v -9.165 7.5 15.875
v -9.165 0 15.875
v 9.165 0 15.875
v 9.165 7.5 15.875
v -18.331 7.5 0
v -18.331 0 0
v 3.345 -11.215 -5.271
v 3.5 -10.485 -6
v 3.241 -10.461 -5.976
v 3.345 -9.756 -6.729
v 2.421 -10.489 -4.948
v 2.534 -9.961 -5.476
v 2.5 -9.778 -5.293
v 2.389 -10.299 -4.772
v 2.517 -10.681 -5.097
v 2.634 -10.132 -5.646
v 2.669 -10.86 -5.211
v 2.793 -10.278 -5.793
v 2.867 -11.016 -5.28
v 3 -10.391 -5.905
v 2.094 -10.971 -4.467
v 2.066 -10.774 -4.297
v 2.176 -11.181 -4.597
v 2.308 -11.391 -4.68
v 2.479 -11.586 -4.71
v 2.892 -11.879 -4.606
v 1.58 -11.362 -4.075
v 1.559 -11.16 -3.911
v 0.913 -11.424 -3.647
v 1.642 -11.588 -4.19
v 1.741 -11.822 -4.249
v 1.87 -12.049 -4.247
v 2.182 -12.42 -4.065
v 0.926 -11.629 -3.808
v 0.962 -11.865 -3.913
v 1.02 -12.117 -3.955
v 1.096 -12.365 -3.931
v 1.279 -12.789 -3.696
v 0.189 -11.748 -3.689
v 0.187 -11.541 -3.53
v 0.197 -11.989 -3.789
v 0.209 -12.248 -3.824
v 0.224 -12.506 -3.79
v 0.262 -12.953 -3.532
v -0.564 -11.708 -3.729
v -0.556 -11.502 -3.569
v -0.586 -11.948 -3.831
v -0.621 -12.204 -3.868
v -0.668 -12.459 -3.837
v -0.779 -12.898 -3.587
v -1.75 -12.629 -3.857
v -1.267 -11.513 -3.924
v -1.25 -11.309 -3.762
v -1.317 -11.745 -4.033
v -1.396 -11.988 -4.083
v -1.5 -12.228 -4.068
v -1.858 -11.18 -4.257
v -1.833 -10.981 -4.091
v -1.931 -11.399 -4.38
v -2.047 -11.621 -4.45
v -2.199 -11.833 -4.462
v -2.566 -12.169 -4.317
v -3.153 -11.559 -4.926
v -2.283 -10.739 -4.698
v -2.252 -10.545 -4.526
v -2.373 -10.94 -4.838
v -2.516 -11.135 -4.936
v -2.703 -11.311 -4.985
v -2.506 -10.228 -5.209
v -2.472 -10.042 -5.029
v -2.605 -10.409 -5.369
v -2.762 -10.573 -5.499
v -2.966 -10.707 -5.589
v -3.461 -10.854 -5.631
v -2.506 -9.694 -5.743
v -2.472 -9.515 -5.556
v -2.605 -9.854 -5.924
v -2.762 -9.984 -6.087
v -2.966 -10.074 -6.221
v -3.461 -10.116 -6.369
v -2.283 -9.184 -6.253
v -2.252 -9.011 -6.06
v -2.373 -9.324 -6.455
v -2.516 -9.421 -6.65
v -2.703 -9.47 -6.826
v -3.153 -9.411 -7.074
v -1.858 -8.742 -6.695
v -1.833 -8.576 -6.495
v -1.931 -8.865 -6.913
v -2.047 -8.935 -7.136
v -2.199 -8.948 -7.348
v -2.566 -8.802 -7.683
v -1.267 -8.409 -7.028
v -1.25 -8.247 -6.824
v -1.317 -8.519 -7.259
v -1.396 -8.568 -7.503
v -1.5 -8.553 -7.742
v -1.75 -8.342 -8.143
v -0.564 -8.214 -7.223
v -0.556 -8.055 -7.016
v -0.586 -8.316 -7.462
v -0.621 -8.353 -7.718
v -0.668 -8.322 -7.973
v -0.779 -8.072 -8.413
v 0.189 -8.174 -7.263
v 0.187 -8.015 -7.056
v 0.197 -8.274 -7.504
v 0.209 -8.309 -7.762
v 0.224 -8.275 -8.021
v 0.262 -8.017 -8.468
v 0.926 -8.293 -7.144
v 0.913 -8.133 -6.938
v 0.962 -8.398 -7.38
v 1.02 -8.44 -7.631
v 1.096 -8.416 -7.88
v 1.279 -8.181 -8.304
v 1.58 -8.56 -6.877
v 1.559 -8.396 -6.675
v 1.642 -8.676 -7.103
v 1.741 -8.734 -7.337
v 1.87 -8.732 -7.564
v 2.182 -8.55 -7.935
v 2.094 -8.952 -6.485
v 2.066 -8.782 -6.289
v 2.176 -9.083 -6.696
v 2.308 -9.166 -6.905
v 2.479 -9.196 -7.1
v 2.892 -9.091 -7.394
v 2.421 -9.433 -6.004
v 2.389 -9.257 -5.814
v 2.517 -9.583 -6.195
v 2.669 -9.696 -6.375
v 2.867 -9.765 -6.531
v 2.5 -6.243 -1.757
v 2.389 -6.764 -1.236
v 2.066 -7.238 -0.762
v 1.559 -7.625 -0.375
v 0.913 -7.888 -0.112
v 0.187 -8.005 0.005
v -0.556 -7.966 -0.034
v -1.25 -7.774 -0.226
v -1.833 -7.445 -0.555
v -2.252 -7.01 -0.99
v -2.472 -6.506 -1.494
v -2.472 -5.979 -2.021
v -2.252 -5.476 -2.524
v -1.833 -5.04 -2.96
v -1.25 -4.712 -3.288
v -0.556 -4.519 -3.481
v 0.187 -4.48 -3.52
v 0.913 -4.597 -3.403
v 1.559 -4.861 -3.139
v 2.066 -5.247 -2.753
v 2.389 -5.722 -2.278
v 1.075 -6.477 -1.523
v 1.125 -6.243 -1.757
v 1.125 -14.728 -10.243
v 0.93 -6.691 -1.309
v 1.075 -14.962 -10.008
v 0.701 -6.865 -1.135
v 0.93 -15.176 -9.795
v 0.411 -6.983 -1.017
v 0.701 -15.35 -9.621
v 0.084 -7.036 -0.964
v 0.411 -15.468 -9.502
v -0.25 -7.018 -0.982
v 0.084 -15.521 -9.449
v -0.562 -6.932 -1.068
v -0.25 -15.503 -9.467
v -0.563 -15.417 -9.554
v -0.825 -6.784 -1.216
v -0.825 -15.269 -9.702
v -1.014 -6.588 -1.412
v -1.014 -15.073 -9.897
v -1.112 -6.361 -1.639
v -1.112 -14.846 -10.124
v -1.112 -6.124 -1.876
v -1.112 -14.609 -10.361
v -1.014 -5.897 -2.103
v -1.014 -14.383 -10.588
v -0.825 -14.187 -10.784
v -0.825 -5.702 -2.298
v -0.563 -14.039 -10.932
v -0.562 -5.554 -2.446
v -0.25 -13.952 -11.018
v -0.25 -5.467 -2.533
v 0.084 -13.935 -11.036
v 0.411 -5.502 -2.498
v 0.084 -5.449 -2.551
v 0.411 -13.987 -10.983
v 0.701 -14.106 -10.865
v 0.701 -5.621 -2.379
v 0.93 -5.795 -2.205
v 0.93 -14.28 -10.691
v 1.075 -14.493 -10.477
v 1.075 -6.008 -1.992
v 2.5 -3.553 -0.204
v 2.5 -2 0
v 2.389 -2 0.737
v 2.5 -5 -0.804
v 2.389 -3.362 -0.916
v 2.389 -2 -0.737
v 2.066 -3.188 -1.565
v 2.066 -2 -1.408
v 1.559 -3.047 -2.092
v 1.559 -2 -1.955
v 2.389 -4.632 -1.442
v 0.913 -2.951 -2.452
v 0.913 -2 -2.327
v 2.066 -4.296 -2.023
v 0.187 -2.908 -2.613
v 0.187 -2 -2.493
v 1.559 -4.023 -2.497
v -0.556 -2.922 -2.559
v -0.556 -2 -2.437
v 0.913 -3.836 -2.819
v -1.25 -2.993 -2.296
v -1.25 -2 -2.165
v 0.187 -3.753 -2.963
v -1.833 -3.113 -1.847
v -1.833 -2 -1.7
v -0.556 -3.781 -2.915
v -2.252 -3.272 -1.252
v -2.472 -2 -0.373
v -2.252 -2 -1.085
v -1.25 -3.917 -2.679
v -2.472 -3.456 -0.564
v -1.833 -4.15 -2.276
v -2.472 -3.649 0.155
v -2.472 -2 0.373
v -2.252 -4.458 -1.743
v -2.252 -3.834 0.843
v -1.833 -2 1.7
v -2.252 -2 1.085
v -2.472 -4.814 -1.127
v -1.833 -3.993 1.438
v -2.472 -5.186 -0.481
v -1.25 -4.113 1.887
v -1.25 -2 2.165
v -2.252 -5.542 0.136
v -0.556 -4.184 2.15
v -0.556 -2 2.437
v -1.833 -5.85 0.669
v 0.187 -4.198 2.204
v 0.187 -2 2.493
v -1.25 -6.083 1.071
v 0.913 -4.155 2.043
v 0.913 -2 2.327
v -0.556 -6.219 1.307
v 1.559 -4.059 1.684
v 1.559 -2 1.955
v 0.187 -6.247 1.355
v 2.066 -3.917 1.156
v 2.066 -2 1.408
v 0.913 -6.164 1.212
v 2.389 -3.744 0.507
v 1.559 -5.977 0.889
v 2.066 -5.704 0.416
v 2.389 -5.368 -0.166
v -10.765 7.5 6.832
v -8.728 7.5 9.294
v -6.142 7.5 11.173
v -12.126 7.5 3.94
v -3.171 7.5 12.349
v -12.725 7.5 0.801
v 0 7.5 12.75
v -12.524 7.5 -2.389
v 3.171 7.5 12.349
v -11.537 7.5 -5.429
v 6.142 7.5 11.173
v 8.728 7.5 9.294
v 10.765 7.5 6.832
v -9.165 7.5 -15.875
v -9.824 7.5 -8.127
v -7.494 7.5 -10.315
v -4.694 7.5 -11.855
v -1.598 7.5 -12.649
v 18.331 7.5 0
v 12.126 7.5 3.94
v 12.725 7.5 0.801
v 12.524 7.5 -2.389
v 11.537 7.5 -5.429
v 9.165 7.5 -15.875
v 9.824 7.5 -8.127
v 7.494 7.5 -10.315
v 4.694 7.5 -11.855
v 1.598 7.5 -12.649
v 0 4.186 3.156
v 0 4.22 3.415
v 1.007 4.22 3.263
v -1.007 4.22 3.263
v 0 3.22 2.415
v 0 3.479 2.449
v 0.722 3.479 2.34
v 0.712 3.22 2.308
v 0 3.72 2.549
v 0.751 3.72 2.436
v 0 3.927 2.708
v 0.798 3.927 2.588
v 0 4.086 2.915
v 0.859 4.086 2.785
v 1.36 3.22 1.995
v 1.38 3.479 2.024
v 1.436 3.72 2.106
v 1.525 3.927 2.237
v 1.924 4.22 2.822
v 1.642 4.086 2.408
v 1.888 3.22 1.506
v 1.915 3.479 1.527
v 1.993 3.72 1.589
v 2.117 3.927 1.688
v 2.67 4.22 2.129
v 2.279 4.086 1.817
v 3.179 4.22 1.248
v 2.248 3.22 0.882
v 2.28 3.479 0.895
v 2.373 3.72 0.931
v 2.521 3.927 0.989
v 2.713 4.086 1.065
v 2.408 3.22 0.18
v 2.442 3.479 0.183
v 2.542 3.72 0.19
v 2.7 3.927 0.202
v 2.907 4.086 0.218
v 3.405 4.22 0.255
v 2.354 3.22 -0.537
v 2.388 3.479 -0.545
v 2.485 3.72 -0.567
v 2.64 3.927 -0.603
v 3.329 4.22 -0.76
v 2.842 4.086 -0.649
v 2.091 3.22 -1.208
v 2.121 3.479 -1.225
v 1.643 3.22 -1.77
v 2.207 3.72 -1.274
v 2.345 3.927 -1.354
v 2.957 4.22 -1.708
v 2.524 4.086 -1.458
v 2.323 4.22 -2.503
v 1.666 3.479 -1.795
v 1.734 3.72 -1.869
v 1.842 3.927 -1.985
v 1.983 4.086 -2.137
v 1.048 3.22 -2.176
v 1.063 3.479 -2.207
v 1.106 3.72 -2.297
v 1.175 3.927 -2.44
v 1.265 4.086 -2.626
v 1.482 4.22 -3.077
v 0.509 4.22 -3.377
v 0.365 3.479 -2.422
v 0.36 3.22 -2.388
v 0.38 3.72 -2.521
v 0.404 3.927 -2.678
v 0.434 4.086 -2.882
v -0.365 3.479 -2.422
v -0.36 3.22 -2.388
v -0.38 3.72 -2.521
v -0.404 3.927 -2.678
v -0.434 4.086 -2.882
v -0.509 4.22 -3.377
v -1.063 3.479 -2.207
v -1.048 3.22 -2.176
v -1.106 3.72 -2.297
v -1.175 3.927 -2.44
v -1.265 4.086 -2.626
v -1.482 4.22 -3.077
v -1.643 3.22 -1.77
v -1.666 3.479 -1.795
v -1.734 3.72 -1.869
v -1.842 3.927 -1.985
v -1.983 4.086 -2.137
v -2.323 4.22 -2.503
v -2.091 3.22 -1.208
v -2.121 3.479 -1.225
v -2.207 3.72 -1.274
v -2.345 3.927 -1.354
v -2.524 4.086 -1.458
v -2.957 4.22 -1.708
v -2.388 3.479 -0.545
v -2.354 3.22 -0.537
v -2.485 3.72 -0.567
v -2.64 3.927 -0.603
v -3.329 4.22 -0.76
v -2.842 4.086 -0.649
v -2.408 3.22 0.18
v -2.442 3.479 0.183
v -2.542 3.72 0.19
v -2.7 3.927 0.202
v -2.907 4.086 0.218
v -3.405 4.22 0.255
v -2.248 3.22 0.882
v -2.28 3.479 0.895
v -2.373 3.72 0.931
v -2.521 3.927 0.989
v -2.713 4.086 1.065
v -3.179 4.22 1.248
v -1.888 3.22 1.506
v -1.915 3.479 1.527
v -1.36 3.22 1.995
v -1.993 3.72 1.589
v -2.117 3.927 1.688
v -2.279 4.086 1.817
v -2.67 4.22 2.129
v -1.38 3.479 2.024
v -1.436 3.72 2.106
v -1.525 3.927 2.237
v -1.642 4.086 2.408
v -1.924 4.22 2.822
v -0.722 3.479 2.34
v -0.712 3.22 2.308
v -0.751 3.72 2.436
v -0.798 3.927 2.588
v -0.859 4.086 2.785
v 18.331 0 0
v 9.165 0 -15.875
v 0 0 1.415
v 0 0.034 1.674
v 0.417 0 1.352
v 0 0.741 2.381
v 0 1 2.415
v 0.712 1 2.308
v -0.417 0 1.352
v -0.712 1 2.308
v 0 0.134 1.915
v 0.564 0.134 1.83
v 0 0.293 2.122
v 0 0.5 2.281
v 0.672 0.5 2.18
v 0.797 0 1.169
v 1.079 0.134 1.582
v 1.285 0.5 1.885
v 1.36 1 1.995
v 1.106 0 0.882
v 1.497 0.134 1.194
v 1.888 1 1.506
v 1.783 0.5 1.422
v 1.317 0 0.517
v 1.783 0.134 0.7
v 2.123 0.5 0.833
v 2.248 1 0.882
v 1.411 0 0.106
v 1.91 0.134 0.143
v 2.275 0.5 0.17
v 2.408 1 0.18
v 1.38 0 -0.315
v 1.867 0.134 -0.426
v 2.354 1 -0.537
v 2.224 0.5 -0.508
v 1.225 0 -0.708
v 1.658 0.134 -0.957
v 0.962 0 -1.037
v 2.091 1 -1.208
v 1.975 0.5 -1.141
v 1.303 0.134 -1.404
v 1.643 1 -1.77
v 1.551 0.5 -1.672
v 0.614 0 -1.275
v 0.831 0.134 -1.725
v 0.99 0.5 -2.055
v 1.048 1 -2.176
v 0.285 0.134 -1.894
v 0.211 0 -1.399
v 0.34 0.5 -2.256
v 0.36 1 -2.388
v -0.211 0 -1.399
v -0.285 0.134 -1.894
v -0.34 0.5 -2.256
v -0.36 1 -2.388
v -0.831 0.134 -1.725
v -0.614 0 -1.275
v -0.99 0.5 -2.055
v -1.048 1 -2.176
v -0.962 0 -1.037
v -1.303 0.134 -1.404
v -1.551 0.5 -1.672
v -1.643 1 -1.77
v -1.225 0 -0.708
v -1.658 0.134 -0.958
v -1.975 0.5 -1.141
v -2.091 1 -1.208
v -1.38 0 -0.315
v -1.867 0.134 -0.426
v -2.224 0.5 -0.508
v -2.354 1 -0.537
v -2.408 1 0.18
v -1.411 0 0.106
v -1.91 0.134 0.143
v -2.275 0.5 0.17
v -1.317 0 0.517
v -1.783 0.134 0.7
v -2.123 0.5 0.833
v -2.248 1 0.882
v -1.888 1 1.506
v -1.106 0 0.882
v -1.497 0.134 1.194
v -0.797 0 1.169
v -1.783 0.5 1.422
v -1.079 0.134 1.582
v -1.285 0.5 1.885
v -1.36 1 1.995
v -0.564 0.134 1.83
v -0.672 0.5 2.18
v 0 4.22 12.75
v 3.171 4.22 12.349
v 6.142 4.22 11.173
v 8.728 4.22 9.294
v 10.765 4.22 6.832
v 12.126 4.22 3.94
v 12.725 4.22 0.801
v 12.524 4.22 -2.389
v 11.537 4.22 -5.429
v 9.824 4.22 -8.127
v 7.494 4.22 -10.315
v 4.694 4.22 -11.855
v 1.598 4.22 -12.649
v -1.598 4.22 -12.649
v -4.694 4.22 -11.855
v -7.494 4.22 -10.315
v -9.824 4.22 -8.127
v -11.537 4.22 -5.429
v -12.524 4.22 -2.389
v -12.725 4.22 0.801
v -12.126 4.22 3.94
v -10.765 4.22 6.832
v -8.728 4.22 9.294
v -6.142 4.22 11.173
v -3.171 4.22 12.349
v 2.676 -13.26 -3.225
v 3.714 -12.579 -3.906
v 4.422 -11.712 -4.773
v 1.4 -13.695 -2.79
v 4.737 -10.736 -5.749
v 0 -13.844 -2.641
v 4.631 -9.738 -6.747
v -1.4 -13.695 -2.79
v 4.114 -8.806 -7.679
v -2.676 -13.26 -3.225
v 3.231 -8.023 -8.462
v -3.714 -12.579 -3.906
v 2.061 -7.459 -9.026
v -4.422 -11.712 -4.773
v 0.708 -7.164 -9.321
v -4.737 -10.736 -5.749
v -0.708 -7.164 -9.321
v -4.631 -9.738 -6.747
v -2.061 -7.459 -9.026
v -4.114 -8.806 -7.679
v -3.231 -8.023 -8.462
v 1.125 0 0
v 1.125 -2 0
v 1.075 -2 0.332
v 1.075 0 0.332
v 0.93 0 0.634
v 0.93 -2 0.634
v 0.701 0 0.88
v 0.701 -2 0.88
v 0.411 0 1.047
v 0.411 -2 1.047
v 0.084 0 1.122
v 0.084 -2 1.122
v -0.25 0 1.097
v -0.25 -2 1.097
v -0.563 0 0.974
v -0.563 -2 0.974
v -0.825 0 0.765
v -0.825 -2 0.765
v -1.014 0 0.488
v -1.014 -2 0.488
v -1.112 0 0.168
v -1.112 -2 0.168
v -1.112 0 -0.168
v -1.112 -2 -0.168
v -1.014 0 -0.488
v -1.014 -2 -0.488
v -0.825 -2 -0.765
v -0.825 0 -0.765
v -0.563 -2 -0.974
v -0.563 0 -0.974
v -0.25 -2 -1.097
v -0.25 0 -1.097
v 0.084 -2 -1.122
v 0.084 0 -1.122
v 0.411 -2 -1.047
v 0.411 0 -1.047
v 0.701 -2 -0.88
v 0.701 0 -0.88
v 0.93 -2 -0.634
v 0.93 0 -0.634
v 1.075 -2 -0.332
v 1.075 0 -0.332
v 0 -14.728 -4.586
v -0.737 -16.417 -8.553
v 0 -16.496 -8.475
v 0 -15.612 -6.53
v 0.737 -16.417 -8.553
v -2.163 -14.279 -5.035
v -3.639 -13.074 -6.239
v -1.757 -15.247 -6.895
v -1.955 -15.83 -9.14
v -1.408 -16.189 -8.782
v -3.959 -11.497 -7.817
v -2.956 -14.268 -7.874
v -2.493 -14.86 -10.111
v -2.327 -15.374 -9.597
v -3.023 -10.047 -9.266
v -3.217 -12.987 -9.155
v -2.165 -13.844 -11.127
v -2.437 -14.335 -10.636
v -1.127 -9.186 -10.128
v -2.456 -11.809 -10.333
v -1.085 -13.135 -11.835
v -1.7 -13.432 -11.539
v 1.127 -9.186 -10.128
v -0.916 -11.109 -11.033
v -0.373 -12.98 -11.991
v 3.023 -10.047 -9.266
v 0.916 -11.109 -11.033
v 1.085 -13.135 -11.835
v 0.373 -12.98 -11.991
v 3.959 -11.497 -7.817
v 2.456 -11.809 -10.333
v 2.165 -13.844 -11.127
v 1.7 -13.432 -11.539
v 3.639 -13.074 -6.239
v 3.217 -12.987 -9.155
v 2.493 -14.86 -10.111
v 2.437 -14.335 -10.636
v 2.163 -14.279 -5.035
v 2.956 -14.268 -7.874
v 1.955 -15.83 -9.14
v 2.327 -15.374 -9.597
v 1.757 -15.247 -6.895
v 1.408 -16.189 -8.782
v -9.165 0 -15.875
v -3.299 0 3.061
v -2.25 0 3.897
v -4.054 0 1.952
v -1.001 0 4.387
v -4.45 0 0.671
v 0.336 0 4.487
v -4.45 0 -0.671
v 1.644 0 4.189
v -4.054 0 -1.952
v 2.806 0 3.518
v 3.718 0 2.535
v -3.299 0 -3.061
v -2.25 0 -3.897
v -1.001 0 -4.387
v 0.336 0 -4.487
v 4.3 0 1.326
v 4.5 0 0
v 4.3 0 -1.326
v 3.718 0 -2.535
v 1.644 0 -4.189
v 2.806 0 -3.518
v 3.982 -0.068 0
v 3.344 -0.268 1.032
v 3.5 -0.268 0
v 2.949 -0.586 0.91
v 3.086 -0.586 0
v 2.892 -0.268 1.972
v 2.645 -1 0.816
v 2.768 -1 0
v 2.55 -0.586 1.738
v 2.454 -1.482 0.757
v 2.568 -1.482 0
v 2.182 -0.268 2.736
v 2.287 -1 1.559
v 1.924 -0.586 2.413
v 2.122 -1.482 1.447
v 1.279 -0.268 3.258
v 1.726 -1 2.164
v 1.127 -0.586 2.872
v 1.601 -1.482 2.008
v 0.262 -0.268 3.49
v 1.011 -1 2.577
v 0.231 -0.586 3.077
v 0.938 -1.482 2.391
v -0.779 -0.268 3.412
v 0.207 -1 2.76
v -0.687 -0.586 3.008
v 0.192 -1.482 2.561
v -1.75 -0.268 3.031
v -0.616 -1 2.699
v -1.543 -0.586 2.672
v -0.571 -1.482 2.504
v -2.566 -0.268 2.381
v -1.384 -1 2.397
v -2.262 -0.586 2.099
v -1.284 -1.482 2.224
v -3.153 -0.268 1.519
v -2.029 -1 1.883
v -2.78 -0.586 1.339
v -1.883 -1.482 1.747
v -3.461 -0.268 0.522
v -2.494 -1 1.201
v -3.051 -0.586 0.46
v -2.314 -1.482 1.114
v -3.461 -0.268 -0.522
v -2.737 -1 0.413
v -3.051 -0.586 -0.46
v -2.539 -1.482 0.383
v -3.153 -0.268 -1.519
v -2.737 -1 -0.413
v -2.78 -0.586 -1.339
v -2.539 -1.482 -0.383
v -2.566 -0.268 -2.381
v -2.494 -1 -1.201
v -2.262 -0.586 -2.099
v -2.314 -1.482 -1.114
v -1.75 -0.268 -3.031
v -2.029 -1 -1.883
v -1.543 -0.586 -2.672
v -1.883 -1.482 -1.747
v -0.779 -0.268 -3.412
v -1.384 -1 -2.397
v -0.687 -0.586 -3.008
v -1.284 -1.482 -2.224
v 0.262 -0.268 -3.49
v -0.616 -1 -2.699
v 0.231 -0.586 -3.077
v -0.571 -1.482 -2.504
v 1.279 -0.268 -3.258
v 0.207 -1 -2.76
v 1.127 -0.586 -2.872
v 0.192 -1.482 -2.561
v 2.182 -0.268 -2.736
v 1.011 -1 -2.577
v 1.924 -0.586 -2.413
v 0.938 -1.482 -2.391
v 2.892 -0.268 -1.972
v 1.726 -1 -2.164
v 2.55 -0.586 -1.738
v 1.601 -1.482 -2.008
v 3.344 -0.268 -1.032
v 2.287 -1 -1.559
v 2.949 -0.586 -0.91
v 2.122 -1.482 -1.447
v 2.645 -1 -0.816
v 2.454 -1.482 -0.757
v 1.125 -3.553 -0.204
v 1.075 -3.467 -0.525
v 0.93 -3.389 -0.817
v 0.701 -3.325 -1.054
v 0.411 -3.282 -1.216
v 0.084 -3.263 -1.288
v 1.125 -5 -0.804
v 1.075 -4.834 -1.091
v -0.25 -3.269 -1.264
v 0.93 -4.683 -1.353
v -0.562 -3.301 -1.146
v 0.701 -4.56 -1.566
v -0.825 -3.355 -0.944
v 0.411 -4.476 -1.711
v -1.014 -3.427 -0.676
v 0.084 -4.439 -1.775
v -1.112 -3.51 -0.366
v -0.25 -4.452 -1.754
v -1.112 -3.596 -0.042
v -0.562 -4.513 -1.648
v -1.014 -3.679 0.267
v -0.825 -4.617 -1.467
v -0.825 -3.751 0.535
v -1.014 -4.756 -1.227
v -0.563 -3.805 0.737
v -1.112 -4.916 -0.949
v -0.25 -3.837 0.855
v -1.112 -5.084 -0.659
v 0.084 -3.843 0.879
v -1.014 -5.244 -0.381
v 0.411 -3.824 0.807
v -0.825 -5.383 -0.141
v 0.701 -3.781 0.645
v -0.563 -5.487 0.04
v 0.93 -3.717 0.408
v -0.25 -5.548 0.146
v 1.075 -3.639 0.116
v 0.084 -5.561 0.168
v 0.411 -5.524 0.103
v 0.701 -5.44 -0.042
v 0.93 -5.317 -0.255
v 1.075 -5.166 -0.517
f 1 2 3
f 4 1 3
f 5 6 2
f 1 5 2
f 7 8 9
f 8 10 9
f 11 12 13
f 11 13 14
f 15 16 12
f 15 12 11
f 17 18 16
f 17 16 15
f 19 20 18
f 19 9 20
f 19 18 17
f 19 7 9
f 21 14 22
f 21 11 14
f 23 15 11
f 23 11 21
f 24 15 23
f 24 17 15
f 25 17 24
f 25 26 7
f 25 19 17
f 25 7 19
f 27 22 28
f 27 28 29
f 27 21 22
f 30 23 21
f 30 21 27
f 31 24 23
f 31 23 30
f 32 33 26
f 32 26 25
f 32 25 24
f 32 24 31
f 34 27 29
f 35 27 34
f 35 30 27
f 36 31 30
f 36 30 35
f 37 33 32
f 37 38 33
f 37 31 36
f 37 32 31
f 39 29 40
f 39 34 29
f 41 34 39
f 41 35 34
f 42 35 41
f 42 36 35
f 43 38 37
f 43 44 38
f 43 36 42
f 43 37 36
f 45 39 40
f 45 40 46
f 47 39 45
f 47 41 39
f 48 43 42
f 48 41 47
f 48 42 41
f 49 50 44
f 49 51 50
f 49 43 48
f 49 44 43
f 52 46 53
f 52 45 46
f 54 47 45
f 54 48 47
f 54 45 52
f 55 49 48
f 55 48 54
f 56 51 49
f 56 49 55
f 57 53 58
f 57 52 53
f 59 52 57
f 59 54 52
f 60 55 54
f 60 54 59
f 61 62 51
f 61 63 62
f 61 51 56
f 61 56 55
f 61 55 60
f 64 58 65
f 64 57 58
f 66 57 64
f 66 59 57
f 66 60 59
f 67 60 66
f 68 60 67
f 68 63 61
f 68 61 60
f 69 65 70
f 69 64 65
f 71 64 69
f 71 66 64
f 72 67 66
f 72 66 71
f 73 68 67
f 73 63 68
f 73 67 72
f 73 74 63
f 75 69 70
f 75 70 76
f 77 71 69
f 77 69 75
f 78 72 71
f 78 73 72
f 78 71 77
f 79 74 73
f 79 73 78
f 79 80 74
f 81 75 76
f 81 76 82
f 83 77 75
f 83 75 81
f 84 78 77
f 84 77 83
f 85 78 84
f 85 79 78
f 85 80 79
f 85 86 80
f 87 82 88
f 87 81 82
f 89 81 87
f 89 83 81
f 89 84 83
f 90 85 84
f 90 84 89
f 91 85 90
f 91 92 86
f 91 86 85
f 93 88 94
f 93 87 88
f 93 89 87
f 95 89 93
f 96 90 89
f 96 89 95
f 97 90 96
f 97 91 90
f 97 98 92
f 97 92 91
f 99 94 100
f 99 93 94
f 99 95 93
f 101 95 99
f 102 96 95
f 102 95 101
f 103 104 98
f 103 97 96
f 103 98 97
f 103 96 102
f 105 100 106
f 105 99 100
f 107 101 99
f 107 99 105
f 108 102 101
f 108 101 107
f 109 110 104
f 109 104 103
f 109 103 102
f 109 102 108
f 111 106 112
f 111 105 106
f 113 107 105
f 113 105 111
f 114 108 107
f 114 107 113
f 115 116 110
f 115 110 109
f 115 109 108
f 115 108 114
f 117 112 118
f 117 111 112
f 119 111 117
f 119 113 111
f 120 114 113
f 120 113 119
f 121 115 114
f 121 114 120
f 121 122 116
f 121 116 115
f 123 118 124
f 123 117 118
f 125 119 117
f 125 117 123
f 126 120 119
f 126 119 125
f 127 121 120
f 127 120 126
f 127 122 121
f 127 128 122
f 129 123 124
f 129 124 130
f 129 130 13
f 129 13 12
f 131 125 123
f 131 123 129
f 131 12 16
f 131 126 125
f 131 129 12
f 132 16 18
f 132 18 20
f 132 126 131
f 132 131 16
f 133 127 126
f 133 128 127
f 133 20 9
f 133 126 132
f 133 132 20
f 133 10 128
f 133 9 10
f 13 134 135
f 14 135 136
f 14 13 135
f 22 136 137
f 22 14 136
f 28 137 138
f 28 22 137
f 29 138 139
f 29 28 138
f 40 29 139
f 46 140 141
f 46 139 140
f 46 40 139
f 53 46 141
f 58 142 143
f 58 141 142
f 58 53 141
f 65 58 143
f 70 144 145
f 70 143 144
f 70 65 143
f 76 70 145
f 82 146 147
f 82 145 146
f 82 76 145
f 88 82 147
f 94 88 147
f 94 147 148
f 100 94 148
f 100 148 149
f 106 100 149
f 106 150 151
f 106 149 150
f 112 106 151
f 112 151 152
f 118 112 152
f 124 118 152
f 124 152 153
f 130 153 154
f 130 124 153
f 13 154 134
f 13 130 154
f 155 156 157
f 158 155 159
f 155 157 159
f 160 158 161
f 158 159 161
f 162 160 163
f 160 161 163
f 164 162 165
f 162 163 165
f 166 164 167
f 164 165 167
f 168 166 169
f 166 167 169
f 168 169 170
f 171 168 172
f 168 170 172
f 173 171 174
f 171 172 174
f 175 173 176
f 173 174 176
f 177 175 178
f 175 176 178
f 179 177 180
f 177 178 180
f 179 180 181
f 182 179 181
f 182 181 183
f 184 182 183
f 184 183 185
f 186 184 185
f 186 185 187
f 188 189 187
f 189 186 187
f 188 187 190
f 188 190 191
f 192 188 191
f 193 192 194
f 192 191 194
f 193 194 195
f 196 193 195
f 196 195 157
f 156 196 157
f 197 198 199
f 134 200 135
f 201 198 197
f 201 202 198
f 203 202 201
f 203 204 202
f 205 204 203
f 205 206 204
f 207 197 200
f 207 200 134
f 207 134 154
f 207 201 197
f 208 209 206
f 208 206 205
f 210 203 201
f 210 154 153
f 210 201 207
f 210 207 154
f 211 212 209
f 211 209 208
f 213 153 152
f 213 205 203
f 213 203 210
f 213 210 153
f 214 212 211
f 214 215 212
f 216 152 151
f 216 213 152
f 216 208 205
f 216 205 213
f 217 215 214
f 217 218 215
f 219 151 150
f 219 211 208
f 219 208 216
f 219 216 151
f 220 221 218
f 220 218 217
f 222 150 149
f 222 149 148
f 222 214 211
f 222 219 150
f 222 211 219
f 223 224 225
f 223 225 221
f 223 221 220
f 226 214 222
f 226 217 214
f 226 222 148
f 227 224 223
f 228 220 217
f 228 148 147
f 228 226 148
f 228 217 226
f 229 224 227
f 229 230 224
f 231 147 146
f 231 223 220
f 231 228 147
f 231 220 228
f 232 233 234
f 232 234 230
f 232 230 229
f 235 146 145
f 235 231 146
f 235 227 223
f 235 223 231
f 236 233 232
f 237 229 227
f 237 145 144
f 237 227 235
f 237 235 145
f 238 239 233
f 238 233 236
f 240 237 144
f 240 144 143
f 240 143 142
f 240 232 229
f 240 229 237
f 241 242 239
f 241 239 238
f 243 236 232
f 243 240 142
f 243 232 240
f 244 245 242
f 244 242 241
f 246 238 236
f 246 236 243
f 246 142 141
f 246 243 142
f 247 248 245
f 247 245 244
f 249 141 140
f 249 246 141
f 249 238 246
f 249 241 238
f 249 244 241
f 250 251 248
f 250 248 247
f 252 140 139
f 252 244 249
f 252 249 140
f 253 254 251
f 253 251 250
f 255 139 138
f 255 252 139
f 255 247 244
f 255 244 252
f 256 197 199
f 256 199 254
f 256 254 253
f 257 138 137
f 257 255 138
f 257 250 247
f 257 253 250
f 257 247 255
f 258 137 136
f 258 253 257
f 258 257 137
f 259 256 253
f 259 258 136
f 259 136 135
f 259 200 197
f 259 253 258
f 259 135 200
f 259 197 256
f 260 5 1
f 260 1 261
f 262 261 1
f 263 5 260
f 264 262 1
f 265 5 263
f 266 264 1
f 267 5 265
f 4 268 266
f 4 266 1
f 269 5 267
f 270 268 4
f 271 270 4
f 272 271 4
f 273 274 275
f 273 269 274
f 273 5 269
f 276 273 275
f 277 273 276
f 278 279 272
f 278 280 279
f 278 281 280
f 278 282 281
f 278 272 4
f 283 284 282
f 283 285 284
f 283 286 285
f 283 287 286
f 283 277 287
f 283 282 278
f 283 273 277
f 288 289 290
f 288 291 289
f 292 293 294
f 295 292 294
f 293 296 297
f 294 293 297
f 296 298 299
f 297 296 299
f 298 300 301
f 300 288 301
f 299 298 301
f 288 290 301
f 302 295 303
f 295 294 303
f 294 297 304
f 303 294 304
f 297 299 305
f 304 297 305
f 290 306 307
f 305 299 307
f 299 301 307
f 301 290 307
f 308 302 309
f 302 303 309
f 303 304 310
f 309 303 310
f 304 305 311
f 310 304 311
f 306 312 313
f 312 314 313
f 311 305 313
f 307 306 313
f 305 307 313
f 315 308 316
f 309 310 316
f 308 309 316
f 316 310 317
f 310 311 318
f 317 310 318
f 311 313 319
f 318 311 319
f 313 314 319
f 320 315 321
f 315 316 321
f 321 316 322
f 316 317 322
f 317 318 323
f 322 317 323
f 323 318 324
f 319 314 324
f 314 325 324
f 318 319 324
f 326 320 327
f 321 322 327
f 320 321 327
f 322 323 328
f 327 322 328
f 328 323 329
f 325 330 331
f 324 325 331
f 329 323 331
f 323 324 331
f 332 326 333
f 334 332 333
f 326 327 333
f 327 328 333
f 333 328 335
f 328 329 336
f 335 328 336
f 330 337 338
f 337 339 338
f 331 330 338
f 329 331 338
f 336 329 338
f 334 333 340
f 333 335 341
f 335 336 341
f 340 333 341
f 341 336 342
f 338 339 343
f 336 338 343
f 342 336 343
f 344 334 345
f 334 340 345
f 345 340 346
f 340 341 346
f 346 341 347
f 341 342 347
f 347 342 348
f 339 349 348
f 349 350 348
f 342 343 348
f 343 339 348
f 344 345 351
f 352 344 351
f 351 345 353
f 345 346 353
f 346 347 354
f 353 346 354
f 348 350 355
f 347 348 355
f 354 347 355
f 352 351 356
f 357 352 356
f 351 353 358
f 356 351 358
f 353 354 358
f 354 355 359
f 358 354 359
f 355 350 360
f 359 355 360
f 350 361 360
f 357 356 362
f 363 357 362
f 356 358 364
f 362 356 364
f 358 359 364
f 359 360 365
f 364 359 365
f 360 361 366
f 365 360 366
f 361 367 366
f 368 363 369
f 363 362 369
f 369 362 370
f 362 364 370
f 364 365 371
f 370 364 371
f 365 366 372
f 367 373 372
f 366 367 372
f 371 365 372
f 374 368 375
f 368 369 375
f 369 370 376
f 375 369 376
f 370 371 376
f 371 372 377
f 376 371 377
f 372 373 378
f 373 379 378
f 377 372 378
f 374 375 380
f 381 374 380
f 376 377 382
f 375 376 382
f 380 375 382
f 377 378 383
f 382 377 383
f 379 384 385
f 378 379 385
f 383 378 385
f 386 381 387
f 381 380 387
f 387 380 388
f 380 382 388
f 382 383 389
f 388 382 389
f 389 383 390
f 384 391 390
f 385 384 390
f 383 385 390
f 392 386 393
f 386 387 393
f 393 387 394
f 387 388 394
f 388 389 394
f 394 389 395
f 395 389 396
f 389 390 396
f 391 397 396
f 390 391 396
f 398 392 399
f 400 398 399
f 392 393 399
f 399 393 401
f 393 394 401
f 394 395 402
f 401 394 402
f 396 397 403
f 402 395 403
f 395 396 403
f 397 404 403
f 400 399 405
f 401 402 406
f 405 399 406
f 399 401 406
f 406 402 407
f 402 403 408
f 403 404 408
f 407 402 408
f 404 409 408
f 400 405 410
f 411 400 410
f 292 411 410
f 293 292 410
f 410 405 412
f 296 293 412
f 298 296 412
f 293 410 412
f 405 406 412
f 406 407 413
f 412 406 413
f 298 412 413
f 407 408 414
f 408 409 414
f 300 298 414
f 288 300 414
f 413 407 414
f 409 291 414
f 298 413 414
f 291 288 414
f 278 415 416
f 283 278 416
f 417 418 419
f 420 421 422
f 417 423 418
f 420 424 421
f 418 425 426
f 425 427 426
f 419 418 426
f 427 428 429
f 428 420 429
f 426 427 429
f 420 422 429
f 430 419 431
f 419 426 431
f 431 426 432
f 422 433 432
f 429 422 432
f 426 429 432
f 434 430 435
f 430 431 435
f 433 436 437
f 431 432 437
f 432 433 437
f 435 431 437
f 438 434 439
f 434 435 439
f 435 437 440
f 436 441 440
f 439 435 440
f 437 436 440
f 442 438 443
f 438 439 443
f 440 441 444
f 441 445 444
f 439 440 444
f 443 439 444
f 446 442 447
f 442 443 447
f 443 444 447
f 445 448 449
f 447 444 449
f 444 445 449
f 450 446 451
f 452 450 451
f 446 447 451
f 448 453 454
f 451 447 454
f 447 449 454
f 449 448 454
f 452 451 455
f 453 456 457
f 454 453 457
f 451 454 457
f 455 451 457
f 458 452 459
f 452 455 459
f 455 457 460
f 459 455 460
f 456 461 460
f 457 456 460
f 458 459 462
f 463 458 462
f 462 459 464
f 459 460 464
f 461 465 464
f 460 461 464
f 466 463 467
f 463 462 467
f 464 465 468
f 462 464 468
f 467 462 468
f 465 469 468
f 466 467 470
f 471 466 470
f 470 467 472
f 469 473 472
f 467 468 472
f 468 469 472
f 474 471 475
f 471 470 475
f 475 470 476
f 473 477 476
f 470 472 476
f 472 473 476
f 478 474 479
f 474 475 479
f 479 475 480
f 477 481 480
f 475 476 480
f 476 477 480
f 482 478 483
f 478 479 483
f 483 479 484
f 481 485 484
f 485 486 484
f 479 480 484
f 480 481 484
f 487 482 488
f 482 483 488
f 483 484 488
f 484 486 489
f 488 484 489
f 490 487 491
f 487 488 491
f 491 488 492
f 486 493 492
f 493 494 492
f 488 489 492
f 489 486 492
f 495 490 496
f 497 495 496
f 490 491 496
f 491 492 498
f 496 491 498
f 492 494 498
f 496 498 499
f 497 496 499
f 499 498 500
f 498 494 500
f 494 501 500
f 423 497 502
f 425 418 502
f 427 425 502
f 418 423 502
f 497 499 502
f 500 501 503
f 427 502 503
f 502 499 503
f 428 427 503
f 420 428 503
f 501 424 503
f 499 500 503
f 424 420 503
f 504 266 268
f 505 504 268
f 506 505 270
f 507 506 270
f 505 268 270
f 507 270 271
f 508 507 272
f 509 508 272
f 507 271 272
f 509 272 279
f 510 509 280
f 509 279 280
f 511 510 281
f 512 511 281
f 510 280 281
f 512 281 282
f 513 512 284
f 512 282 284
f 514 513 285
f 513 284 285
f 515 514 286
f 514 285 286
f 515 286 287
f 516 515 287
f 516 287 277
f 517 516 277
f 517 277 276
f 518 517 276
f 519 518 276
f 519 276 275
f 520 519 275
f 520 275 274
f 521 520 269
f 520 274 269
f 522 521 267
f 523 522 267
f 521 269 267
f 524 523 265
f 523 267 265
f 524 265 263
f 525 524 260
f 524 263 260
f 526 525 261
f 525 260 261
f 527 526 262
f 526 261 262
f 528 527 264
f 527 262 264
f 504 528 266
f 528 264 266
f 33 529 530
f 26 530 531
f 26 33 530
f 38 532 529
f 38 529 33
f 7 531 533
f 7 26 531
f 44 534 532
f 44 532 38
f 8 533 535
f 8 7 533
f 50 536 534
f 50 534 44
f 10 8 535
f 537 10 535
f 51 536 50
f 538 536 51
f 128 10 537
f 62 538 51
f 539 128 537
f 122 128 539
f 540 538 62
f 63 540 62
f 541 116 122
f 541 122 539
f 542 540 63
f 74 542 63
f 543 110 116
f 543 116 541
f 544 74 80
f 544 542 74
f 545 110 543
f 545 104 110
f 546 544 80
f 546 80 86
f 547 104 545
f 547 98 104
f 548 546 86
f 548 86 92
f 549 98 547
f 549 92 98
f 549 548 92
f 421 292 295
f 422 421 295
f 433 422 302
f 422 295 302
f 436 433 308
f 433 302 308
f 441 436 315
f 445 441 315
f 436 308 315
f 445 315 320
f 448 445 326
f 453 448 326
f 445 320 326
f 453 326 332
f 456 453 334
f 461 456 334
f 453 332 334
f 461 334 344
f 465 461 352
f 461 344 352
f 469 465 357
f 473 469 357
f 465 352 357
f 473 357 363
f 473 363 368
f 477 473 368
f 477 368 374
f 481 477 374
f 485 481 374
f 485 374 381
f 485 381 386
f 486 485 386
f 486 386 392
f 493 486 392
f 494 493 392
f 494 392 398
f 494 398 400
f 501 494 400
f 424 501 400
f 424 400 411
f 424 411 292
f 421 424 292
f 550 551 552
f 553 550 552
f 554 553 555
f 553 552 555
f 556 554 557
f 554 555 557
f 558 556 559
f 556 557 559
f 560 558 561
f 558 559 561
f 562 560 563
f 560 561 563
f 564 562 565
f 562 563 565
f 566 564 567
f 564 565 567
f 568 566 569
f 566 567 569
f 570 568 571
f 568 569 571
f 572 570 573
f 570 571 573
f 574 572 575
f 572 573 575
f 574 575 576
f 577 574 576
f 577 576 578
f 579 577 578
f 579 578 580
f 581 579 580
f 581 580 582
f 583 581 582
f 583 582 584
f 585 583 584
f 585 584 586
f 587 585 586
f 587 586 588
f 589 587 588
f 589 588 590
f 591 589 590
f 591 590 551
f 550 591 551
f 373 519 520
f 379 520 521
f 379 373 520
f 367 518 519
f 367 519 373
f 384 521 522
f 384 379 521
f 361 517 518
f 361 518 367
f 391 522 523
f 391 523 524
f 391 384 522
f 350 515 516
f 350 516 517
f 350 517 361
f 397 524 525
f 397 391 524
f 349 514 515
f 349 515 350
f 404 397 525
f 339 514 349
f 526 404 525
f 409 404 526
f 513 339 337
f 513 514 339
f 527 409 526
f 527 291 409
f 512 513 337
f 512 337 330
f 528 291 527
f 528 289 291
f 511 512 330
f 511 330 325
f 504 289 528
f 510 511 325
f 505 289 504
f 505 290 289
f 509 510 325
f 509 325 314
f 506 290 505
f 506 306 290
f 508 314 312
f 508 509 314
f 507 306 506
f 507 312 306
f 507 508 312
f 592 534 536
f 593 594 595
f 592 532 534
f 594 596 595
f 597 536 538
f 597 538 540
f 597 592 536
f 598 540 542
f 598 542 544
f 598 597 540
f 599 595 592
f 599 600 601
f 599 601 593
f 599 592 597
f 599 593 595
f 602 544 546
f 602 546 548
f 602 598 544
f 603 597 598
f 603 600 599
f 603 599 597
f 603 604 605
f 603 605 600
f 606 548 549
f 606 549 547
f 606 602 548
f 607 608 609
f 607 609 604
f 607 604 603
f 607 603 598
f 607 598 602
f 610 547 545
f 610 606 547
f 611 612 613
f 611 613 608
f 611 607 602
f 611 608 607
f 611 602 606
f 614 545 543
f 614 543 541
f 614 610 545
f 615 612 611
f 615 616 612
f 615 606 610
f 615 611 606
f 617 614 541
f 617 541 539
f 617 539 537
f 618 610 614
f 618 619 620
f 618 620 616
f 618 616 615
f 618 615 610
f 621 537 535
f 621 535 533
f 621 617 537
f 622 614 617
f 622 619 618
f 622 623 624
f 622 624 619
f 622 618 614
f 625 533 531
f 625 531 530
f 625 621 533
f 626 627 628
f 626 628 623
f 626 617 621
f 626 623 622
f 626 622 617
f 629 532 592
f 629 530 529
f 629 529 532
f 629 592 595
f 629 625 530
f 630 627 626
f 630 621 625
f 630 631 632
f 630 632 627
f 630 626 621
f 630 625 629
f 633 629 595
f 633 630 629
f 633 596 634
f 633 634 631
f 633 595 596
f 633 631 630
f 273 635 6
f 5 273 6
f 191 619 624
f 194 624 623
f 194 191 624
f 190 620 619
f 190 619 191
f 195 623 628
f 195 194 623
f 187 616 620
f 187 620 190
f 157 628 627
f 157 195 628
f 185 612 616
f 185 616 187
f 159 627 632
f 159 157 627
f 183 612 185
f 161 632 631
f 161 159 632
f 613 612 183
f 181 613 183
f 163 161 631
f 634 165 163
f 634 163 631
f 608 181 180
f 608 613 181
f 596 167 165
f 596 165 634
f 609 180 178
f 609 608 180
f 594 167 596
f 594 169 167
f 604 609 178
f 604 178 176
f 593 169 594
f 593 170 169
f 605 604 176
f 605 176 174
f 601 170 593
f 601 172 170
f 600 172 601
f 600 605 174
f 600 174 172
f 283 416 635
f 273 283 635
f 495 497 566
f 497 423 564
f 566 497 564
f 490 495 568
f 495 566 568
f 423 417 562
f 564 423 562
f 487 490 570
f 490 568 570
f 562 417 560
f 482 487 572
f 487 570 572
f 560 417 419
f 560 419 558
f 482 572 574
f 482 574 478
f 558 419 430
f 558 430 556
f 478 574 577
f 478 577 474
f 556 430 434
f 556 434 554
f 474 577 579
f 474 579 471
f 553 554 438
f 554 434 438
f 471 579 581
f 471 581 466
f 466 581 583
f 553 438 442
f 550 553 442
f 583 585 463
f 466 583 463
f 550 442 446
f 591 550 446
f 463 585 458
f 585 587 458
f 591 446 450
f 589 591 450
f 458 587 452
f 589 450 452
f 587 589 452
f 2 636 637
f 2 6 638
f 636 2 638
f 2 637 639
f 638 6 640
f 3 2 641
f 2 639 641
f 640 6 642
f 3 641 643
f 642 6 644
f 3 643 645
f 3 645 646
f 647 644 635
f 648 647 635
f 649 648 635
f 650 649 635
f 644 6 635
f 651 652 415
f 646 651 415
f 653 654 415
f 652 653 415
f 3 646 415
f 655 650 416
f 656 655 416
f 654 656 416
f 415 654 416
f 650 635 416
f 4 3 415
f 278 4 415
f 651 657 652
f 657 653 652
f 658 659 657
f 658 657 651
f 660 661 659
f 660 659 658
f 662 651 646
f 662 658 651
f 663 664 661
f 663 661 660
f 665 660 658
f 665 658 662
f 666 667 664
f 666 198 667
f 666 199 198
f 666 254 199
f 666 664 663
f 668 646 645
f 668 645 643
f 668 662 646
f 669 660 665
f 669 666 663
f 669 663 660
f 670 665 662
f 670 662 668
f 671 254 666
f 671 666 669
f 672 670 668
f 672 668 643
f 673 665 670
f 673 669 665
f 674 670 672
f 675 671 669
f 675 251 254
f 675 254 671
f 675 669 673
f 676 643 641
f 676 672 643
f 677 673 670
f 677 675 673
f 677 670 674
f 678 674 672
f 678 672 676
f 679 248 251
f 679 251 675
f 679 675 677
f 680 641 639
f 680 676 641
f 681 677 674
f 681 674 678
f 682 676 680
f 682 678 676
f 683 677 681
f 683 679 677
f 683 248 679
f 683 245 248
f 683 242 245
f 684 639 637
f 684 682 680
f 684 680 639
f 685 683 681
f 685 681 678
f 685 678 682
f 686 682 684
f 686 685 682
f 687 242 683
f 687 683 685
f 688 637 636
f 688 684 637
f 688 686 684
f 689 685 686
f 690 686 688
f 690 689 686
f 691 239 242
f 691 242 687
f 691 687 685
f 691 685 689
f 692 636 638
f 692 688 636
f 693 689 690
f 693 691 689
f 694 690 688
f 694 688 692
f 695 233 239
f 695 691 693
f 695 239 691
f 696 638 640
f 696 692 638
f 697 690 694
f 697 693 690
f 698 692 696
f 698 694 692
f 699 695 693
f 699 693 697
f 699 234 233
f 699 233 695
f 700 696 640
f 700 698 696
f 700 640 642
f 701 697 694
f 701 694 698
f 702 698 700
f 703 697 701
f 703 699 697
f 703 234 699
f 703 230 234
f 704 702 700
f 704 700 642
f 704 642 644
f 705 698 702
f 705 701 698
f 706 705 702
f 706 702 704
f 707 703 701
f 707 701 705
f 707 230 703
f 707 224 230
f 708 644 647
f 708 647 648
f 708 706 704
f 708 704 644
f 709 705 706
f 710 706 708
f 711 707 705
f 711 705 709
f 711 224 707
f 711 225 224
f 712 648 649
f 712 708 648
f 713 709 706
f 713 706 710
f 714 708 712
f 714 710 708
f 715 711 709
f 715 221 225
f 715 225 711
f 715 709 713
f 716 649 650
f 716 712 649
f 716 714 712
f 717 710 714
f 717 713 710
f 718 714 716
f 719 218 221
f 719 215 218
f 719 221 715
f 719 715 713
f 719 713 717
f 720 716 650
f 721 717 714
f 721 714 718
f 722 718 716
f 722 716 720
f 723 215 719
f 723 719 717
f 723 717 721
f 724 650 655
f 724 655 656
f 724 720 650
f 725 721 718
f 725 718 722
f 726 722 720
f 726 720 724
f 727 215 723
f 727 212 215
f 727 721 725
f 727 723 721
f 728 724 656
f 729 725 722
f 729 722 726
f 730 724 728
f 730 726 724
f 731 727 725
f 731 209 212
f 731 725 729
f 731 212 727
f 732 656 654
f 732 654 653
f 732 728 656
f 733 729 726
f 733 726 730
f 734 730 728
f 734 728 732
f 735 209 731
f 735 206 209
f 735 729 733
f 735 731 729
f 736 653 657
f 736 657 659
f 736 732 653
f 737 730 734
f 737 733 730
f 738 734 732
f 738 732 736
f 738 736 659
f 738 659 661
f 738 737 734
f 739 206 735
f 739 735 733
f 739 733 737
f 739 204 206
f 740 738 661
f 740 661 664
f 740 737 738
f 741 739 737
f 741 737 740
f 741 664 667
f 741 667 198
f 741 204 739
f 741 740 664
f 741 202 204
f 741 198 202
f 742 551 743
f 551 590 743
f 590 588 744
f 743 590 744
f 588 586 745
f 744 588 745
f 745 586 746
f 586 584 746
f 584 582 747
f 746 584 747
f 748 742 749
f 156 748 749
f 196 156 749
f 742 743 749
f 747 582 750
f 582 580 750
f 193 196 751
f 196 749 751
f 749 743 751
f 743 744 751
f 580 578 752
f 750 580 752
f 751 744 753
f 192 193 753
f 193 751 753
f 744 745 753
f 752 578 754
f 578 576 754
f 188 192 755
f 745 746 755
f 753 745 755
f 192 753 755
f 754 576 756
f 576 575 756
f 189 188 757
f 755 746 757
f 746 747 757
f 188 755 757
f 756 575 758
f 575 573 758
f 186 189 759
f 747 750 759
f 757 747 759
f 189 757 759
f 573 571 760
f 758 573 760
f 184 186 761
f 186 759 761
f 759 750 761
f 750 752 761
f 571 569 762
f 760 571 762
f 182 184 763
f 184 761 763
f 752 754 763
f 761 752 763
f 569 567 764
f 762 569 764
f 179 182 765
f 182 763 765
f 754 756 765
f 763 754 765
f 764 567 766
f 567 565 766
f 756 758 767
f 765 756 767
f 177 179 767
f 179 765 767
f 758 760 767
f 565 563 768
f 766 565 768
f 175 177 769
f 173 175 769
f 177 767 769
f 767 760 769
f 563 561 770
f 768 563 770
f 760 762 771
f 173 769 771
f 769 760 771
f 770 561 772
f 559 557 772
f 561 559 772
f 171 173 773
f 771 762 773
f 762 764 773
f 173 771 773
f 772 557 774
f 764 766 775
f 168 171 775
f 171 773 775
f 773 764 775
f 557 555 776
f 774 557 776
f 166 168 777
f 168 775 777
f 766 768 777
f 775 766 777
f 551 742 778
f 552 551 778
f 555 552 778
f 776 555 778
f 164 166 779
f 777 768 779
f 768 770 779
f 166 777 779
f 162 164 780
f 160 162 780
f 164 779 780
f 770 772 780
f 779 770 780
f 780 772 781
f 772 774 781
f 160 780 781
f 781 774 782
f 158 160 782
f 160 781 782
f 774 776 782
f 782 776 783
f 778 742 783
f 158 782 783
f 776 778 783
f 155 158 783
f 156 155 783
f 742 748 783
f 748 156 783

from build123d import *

# Parameters (mm, degrees)
MAINHOLDER_DEPTH   = 7.5
SKETCH12_R         = 12.75
MAGNETCUTOUT_DEPTH = 3.28
MAGNETHOLE_REACH   = 26.614
SKETCH13_R         = 2.415
DRAINOPENING_R     = 2.5
DRAINOPENING_R_2   = 1.125
DRAINBASEFILLET_R  = 2
BARBBASEFILLET_R   = 1
DRAINOPENFILLET_R  = 1
MAGNETFILLET_R     = 1


with BuildPart() as part:
    # Sketch11 → MainHolder (new body)
    with BuildSketch(Plane(origin=(0, 0, 0), x_dir=(1, 0, 0), z_dir=(0, 1, 0))):
        Polygon((18.330871047, 0), (9.165435523, 15.875), (-9.165435523, 15.875), (-18.330871047, 0), (-9.165435523, -15.875), (9.165435523, -15.875), align=None)
    extrude(amount=MAINHOLDER_DEPTH)

    # Sketch12 → MagnetCutout (cut)
    with BuildSketch(Plane(origin=(0, 7.5, 0), x_dir=(1, 0, 0), z_dir=(0, 1, 0))):
        with Locations(Location((0, 0, 0), (0, 0, 270))):
            Circle(SKETCH12_R)
    extrude(amount=-MAGNETCUTOUT_DEPTH, mode=Mode.SUBTRACT)

    # Sketch13 → MagnetHole (cut, up to next)
    with BuildSketch(Plane(origin=(0, 4.22, 0), x_dir=(1, 0, 0), z_dir=(0, 1, 0)), mode=Mode.PRIVATE) as magnethole_sk1:
        with Locations(Location((0, 0, 0), (0, 0, 270))):
            Circle(SKETCH13_R)
    magnethole_tool1 = extrude(magnethole_sk1.sketch, amount=-MAGNETHOLE_REACH, mode=Mode.PRIVATE) & part.part
    add(magnethole_tool1.solids().sort_by_distance((0, 4.22, 0))[0], mode=Mode.SUBTRACT)

    # Drain: sweep along a path in DrainPath
    with BuildLine(Plane(origin=(0, 0, 0), x_dir=(0, 0, -1), z_dir=(1, 0, 0))) as drain_path:
        Line((0, 0), (0, -2))
        ThreePointArc((0, -2), (0.456722805, -4.296100594), (1.757359313, -6.242640687))
        Line((1.757359313, -6.242640687), (10.242640687, -14.727922061))
    # DrainOpening → Drain (sweep)
    with BuildSketch(Plane.XZ):
        Circle(DRAINOPENING_R)
        Circle(DRAINOPENING_R_2, mode=Mode.SUBTRACT)
    sweep(path=drain_path.line)

    # BarbOutline → Barb (revolve)
    with BuildSketch(Plane(origin=(0, 0, 0), x_dir=(0, -0.7071067811865461, -0.7071067811865489), z_dir=(-1, 0, 0)), mode=Mode.PRIVATE) as barb_sk:
        Polygon((17.656854249, 0.671572875), (11.656854249, 0.671572875), (11.656854249, -1.578427125), align=None)
    revolve(barb_sk.sketch.rotate(Axis((0, -5.447145558, -0.961864184), (0, -0.7071067811865461, -0.707106781186549)), 180), axis=Axis((0, -5.447145558, -0.961864184), (0, -0.7071067811865461, -0.707106781186549)))

    # DrainBaseFillet
    drainbasefillet_edges = [part.edges().sort_by_distance(p)[0] for p in [
        (-2.5, 0, 0),
    ]]
    fillet(drainbasefillet_edges, radius=DRAINBASEFILLET_R - 0.0001)  # a hair under: the kernel refuses the full size

    # BarbBaseFillet
    barbbasefillet_edges = [part.edges().sort_by_distance(p)[0] for p in [
        (-2.5, -10.485281374, -6),
    ]]
    fillet(barbbasefillet_edges, radius=BARBBASEFILLET_R)

    # DrainOpenFillet
    drainopenfillet_edges = [part.edges().sort_by_distance(p)[0] for p in [
        (0, 0, -2.415),
    ]]
    fillet(drainopenfillet_edges, radius=DRAINOPENFILLET_R)

    # MagnetFillet
    magnetfillet_edges = [part.edges().sort_by_distance(p)[0] for p in [
        (0, 4.22, -2.415),
    ]]
    fillet(magnetfillet_edges, radius=MAGNETFILLET_R)


solid = part.part
